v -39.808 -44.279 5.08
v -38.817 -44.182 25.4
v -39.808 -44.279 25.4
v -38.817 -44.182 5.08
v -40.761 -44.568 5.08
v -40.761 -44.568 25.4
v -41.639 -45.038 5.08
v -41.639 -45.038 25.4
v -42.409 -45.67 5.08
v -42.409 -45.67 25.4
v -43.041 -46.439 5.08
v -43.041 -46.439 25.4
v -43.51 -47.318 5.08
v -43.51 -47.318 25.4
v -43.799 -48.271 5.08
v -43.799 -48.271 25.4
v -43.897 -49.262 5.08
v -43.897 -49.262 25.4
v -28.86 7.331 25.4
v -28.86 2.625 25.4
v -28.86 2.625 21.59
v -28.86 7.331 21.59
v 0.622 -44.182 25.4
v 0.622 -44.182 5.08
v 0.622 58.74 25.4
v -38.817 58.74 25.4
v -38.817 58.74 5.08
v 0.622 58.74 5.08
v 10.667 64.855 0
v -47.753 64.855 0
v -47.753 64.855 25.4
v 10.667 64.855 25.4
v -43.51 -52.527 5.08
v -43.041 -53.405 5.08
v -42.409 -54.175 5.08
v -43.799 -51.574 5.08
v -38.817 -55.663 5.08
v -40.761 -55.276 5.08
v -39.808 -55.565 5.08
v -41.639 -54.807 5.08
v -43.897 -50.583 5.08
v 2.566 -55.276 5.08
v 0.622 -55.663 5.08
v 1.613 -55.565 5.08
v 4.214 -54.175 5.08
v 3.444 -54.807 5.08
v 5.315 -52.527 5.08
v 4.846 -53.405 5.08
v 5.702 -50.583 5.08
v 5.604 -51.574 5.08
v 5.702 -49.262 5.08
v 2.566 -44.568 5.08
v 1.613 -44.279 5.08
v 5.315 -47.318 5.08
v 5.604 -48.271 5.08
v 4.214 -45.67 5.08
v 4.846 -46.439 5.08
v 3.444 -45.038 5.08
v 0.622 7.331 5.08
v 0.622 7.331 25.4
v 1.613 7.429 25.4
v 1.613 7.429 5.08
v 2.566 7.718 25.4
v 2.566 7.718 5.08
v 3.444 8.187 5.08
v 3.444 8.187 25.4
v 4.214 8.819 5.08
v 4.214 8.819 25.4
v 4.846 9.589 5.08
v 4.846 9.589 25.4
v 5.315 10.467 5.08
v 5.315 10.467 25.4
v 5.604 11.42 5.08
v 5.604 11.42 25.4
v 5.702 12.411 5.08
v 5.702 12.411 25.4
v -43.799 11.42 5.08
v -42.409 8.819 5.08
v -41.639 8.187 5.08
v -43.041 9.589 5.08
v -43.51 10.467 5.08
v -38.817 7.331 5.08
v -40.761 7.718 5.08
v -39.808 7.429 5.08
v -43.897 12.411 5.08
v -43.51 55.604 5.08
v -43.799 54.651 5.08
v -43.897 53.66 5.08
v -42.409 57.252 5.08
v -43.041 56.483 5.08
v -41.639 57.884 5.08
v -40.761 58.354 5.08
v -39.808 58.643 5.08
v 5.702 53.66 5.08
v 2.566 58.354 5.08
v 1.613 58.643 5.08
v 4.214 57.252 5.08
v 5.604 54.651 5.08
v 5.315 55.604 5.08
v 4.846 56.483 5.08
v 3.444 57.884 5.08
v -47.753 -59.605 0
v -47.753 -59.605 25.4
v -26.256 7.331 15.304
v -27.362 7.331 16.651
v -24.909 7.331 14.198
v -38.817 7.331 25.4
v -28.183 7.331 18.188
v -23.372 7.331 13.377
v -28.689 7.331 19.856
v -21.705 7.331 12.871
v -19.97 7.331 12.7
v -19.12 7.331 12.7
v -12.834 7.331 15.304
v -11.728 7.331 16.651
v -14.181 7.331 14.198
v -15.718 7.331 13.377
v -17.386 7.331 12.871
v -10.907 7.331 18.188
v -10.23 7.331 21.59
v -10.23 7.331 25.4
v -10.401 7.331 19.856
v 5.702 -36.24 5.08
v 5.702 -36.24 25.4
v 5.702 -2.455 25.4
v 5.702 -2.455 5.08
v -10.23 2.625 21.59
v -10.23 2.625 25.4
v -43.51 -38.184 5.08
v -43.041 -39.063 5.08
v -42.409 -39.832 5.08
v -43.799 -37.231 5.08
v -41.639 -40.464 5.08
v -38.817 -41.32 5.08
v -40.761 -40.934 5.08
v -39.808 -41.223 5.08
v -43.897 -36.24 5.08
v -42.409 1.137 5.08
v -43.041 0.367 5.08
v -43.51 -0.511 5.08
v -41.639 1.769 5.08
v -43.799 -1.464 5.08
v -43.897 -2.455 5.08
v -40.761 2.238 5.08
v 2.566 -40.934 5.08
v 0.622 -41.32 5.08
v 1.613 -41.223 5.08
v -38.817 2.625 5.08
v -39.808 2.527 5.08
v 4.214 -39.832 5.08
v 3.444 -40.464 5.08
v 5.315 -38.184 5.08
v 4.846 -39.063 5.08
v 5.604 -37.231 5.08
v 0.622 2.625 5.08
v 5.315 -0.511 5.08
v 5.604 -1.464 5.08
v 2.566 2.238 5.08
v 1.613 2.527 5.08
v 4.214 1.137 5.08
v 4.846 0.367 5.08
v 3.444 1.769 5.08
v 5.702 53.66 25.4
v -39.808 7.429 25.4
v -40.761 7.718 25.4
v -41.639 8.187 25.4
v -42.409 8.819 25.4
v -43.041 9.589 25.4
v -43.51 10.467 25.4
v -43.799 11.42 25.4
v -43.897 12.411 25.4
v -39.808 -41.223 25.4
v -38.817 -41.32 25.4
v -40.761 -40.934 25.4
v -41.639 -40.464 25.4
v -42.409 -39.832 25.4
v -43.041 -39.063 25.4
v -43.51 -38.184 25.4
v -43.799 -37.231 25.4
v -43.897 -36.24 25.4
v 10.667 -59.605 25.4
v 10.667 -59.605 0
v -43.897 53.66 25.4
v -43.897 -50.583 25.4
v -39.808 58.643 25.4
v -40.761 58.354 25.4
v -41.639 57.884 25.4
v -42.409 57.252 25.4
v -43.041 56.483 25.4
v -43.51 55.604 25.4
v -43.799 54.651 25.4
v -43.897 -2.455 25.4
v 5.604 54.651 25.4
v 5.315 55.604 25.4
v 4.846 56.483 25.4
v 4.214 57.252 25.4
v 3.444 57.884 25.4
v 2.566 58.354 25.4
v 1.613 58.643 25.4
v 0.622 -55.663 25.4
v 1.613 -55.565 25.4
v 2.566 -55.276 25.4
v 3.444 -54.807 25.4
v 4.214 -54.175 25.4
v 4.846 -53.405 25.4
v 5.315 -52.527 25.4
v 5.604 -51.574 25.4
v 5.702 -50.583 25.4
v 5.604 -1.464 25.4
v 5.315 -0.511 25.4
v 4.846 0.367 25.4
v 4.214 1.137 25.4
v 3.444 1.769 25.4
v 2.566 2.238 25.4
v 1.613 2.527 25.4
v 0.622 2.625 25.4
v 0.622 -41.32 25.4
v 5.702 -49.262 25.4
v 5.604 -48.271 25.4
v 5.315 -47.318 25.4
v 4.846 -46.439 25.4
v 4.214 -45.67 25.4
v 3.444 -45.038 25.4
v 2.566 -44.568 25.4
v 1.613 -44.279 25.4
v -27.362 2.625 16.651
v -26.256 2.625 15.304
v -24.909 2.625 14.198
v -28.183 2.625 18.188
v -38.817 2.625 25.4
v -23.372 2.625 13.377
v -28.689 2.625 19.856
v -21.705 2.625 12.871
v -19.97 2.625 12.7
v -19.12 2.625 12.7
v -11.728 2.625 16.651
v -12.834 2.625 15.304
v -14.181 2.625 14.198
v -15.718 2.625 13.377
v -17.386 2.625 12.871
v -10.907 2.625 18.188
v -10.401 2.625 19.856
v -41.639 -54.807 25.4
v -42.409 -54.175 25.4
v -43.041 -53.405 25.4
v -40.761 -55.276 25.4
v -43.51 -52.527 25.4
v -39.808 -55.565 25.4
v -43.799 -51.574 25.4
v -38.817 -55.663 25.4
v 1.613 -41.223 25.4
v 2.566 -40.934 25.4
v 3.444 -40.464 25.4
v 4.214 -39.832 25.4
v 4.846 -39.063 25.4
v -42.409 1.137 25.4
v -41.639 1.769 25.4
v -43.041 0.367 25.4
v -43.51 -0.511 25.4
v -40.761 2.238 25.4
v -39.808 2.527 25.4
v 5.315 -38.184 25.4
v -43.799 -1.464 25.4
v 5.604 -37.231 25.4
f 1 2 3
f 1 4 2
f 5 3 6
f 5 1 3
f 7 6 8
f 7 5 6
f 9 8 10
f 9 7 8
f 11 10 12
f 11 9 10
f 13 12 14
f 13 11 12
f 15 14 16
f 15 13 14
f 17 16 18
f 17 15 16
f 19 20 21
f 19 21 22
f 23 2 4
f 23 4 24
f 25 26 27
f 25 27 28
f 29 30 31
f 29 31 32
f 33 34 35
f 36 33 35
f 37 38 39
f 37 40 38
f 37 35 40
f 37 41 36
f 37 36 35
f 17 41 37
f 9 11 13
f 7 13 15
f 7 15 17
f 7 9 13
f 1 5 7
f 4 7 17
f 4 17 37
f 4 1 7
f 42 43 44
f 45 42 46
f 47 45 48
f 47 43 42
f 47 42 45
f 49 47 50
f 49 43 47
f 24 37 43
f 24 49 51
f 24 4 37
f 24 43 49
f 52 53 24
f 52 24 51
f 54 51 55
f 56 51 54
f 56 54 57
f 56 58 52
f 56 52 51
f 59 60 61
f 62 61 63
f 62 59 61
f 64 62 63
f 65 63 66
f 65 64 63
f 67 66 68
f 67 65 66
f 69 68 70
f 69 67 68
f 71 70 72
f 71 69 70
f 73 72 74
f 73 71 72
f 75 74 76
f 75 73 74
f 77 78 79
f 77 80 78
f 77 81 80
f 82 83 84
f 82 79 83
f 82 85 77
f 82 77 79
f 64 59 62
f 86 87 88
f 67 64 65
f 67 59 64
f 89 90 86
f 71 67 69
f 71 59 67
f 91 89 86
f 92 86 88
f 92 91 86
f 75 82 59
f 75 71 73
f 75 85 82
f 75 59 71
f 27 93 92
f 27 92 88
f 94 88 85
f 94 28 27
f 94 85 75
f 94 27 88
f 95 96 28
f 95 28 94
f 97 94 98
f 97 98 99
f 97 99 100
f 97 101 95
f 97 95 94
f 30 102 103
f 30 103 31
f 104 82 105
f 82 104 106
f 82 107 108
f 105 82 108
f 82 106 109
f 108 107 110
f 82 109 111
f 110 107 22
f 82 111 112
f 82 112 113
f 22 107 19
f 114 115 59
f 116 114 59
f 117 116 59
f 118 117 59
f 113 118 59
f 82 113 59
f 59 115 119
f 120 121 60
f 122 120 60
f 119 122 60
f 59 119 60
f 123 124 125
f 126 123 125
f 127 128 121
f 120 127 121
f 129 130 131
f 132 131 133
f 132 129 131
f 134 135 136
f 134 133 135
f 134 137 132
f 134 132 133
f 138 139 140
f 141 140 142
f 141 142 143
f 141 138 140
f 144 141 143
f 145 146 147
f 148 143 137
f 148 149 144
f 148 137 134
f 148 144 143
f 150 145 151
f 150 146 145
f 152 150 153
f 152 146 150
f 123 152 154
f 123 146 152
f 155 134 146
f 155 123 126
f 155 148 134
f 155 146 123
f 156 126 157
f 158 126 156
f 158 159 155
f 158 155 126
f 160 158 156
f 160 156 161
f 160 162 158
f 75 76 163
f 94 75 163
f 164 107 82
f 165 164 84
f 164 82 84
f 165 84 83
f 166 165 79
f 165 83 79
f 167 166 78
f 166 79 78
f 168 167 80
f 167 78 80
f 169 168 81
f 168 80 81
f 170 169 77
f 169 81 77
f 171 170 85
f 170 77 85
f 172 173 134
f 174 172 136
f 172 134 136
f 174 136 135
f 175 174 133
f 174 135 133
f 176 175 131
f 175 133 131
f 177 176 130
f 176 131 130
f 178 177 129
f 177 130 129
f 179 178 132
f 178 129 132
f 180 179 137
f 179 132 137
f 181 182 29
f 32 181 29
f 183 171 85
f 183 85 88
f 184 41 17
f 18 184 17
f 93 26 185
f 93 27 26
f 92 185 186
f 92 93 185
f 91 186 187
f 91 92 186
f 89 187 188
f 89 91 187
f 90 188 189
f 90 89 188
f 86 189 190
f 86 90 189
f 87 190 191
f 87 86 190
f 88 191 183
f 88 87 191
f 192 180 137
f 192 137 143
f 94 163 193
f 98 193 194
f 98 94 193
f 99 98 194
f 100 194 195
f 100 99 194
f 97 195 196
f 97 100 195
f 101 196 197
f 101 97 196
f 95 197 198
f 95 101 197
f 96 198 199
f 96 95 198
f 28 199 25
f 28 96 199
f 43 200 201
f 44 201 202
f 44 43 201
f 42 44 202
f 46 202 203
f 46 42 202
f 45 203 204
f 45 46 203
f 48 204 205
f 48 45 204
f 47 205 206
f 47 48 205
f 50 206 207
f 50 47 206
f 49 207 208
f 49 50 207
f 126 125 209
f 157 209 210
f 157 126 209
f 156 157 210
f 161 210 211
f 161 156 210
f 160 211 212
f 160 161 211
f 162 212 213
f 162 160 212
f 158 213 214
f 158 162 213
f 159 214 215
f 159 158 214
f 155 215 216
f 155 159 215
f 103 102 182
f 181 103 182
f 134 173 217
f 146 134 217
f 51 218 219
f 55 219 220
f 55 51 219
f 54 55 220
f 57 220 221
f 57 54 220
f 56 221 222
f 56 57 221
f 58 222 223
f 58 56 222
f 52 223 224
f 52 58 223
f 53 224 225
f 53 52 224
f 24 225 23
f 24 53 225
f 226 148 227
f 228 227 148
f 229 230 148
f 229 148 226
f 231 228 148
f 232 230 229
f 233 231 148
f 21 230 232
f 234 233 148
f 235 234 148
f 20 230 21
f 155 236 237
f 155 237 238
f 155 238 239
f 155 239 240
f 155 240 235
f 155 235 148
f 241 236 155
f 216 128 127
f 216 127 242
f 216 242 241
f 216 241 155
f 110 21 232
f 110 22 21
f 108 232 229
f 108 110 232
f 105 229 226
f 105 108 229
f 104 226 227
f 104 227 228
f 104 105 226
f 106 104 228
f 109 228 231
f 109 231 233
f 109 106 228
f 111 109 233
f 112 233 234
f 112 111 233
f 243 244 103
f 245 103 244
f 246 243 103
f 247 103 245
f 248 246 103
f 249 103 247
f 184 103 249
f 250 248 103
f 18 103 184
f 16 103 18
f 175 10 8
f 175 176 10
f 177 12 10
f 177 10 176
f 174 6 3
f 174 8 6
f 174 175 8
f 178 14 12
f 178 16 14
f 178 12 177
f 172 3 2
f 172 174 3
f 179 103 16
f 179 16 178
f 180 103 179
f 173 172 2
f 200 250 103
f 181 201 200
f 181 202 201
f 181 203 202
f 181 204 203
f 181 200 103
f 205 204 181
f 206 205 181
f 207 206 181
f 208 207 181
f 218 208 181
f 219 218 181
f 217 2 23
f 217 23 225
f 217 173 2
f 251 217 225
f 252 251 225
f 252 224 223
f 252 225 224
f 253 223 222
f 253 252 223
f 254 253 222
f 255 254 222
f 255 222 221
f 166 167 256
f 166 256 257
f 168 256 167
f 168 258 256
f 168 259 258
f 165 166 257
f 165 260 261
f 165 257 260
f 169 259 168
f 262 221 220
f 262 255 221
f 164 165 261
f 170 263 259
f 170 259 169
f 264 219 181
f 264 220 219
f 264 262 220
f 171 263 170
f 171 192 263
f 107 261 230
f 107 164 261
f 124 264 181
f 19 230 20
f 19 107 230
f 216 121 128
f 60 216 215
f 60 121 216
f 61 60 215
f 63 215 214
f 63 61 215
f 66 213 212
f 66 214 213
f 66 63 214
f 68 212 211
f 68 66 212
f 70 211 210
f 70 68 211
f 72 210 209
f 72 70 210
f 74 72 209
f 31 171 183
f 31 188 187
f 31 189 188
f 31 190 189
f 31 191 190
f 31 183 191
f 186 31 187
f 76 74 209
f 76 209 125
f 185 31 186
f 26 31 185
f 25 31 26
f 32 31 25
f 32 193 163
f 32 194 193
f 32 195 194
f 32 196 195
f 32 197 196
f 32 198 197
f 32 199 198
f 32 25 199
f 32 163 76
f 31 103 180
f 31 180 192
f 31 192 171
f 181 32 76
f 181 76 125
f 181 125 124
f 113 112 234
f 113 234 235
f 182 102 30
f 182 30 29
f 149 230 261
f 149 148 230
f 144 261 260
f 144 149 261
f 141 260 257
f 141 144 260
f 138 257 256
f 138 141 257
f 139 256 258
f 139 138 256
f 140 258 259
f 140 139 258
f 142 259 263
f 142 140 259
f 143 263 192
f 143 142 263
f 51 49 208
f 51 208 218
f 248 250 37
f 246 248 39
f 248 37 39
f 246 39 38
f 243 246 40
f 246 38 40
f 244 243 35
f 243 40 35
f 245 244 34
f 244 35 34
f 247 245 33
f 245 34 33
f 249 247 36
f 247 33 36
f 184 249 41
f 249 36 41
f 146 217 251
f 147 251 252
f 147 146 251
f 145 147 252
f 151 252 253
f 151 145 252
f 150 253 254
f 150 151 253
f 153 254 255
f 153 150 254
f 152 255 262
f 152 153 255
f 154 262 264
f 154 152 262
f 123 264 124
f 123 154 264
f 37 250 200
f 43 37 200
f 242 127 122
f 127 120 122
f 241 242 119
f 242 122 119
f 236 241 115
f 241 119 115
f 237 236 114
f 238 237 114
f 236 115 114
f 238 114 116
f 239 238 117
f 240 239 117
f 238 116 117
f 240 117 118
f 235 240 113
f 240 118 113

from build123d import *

# Parameters (mm, degrees)
F0_W     = 58.42
F0_H     = 124.46
F1_DEPTH = 25.4
F2_W     = 49.598961
F2_H     = 51.409137
F2_H_2   = 43.945098
F2_H_3   = 11.481412
F3_DEPTH = 20.32
F4_R     = 5.08
F5_W     = 18.630186
F5_H     = 46.435684
F6_DEPTH = 12.7
F7_R     = 8.89


with BuildPart() as f1:
    # F0 (on Top) → F1 (new body)
    with BuildSketch(Plane.XY):
        with Locations((-18.543279, 2.624761)):
            Rectangle(F0_W, F0_H)
    extrude(amount=F1_DEPTH)

    # F2 (on face) → F3 (cut)
    with BuildSketch(Plane.XY.offset(25.4)):
        with Locations((-19.09741, 33.035801)):
            Rectangle(F2_W, F2_H)
        with Locations((-19.09741, -19.347788)):
            Rectangle(F2_W, F2_H_2)
        with Locations((-19.09741, -49.922362)):
            Rectangle(F2_W, F2_H_3)
    extrude(amount=-F3_DEPTH, mode=Mode.SUBTRACT)

    # F4
    f4_edges = [f1.edges().sort_by_distance(p)[0] for p in [
        (5.70207, 58.74037, 15.24),
        (-43.896891, 58.74037, 15.24),
        (-43.896891, 7.331233, 15.24),
        (5.70207, 7.331233, 15.24),
        (-43.896891, 2.624761, 15.24),
        (5.70207, 2.624761, 15.24),
        (5.70207, -41.320337, 15.24),
        (-43.896891, -41.320337, 15.24),
        (5.70207, -44.181656, 15.24),
        (5.70207, -55.663068, 15.24),
        (-43.896891, -44.181656, 15.24),
        (-43.896891, -55.663068, 15.24),
    ]]
    fillet(f4_edges, radius=F4_R)

    # F5 (on face) → F6 (cut)
    with BuildSketch(Plane.XY.offset(25.4)):
        with Locations((-19.545062, -9.993736)):
            Rectangle(F5_W, F5_H)
    extrude(amount=-F6_DEPTH, mode=Mode.SUBTRACT)

    # F7
    f7_edges = [f1.edges().sort_by_distance(p)[0] for p in [
        (-10.229969, 4.977997, 12.7),
        (-28.860155, 4.977997, 12.7),
    ]]
    fillet(f7_edges, radius=F7_R)


solid = f1.part
